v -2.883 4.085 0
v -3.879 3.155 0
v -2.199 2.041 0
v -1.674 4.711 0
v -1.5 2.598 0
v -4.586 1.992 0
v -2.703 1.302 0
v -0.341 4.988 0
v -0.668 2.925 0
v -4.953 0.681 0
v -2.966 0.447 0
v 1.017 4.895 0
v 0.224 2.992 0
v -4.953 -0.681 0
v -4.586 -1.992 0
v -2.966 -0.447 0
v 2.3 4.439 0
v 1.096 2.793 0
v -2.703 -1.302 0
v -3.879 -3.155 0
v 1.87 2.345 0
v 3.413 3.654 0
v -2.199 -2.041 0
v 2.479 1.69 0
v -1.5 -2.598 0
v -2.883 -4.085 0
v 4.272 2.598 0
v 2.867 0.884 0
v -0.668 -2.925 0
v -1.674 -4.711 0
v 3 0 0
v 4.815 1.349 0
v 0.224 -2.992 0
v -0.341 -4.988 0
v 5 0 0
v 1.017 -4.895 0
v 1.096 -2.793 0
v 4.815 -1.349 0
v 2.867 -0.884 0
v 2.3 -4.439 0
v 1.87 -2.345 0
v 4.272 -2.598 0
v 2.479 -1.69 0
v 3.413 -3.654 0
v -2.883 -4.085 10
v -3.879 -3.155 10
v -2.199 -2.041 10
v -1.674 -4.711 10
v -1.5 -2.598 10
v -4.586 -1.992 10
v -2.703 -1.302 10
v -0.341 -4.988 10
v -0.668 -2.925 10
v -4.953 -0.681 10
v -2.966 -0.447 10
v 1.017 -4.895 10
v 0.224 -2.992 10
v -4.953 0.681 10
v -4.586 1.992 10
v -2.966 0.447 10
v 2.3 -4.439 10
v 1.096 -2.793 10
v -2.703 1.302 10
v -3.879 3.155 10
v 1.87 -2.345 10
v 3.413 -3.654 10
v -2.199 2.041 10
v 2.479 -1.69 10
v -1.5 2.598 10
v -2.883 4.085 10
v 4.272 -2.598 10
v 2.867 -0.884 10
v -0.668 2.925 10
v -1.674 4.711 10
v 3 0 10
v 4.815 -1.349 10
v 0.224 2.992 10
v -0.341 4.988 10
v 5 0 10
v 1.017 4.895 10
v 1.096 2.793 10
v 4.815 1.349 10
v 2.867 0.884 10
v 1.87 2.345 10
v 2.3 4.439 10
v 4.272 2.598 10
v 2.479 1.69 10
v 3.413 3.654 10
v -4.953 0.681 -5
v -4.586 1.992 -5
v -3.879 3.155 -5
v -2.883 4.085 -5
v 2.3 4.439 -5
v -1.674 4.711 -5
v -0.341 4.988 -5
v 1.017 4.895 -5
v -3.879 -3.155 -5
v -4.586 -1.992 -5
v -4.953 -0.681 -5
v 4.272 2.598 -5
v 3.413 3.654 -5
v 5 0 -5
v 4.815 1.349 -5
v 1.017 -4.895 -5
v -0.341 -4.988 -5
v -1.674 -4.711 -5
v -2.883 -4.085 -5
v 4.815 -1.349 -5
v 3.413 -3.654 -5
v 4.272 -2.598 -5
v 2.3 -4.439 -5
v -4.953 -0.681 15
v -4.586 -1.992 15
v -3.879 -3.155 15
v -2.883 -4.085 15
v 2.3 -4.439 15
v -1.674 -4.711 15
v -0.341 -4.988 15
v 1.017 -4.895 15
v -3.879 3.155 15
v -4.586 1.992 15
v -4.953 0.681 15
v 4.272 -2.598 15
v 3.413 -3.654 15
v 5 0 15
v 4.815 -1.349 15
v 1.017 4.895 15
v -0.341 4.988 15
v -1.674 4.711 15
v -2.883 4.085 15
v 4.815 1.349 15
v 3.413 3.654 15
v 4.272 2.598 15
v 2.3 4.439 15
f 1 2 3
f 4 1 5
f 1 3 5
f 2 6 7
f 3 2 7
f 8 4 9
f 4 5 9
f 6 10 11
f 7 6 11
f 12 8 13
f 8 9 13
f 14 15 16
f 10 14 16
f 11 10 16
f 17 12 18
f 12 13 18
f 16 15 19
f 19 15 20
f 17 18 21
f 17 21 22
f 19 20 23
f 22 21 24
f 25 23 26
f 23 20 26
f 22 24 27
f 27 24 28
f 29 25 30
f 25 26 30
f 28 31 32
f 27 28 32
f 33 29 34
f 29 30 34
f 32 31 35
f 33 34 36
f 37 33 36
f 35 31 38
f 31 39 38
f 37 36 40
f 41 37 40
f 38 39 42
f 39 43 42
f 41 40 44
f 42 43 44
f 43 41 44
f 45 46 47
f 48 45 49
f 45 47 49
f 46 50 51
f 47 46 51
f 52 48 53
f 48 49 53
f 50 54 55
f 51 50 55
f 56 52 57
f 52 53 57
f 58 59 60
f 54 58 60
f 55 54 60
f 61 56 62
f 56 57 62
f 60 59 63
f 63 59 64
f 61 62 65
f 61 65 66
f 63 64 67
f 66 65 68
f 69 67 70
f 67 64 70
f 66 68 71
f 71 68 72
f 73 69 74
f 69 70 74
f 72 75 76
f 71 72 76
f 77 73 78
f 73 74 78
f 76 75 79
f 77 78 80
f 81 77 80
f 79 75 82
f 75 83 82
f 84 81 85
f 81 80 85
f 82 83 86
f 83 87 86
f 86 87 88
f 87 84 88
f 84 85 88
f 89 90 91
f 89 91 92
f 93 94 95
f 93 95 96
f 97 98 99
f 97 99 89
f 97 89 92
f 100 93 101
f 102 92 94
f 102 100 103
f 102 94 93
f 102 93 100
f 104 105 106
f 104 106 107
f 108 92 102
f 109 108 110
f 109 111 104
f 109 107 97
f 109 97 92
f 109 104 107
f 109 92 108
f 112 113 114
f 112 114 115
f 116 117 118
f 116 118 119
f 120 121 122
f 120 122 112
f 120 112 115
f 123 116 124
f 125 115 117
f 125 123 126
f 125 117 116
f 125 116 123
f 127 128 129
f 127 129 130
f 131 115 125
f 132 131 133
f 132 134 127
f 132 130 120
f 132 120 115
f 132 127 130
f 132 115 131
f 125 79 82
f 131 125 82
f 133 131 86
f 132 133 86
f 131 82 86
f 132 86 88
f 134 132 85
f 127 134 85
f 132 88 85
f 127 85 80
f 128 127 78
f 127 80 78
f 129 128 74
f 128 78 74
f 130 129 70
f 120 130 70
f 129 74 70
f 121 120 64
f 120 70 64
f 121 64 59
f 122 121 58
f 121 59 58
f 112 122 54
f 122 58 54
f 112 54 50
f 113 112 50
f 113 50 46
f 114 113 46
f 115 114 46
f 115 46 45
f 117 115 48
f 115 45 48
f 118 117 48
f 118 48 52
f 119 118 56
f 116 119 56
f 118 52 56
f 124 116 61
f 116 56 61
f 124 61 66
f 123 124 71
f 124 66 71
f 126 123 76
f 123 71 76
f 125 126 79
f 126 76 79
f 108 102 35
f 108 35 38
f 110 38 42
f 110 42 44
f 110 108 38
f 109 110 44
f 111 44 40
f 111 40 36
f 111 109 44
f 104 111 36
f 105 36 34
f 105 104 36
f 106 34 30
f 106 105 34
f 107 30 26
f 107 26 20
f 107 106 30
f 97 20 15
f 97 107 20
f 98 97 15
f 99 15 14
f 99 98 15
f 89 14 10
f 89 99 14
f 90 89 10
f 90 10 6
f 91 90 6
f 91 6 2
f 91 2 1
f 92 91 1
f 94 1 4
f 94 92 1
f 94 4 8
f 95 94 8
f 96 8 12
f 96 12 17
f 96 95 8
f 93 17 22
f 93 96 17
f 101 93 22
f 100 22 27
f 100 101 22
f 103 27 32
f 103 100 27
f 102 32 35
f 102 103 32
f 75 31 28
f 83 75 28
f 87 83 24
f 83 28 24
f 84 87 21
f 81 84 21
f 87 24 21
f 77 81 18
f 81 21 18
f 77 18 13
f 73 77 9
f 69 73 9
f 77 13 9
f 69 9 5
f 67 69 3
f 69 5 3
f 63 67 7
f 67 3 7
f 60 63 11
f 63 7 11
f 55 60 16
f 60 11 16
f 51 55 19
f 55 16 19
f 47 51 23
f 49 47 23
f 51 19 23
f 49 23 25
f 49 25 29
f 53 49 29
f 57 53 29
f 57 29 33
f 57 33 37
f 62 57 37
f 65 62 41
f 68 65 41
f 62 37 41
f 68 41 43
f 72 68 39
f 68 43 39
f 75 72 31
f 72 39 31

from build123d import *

# Parameters (mm, degrees)
ESQUISSE1_R        = 3
BOSS_EXTRU_1_DEPTH = 10
ESQUISSE2_R        = 5
BOSS_EXTRU_3_DEPTH = 5
BOSS_EXTRU_4_START = 5
ESQUISSE3_R        = 5
BOSS_EXTRU_4_DEPTH = 5


with BuildPart() as part:
    # Esquisse1 → Boss.-Extru.1 (new body)
    with BuildSketch(Plane.XY):
        Circle(ESQUISSE1_R)
    extrude(amount=BOSS_EXTRU_1_DEPTH)

    # Esquisse2 → Boss.-Extru.3 (add)
    with BuildSketch(Plane.XY.offset(10)):
        Circle(ESQUISSE2_R)
    extrude(amount=BOSS_EXTRU_3_DEPTH)

    # Esquisse3 → Boss.-Extru.4 (add)
    with BuildSketch(Plane(origin=(0, 0, 0), x_dir=(-1, 0, 0), z_dir=(0, 0, -1)).offset(BOSS_EXTRU_4_START)):
        with Locations(Location((0, 0, 0), (0, 0, 180))):
            Circle(ESQUISSE3_R)
    extrude(amount=-BOSS_EXTRU_4_DEPTH)


solid = part.part
